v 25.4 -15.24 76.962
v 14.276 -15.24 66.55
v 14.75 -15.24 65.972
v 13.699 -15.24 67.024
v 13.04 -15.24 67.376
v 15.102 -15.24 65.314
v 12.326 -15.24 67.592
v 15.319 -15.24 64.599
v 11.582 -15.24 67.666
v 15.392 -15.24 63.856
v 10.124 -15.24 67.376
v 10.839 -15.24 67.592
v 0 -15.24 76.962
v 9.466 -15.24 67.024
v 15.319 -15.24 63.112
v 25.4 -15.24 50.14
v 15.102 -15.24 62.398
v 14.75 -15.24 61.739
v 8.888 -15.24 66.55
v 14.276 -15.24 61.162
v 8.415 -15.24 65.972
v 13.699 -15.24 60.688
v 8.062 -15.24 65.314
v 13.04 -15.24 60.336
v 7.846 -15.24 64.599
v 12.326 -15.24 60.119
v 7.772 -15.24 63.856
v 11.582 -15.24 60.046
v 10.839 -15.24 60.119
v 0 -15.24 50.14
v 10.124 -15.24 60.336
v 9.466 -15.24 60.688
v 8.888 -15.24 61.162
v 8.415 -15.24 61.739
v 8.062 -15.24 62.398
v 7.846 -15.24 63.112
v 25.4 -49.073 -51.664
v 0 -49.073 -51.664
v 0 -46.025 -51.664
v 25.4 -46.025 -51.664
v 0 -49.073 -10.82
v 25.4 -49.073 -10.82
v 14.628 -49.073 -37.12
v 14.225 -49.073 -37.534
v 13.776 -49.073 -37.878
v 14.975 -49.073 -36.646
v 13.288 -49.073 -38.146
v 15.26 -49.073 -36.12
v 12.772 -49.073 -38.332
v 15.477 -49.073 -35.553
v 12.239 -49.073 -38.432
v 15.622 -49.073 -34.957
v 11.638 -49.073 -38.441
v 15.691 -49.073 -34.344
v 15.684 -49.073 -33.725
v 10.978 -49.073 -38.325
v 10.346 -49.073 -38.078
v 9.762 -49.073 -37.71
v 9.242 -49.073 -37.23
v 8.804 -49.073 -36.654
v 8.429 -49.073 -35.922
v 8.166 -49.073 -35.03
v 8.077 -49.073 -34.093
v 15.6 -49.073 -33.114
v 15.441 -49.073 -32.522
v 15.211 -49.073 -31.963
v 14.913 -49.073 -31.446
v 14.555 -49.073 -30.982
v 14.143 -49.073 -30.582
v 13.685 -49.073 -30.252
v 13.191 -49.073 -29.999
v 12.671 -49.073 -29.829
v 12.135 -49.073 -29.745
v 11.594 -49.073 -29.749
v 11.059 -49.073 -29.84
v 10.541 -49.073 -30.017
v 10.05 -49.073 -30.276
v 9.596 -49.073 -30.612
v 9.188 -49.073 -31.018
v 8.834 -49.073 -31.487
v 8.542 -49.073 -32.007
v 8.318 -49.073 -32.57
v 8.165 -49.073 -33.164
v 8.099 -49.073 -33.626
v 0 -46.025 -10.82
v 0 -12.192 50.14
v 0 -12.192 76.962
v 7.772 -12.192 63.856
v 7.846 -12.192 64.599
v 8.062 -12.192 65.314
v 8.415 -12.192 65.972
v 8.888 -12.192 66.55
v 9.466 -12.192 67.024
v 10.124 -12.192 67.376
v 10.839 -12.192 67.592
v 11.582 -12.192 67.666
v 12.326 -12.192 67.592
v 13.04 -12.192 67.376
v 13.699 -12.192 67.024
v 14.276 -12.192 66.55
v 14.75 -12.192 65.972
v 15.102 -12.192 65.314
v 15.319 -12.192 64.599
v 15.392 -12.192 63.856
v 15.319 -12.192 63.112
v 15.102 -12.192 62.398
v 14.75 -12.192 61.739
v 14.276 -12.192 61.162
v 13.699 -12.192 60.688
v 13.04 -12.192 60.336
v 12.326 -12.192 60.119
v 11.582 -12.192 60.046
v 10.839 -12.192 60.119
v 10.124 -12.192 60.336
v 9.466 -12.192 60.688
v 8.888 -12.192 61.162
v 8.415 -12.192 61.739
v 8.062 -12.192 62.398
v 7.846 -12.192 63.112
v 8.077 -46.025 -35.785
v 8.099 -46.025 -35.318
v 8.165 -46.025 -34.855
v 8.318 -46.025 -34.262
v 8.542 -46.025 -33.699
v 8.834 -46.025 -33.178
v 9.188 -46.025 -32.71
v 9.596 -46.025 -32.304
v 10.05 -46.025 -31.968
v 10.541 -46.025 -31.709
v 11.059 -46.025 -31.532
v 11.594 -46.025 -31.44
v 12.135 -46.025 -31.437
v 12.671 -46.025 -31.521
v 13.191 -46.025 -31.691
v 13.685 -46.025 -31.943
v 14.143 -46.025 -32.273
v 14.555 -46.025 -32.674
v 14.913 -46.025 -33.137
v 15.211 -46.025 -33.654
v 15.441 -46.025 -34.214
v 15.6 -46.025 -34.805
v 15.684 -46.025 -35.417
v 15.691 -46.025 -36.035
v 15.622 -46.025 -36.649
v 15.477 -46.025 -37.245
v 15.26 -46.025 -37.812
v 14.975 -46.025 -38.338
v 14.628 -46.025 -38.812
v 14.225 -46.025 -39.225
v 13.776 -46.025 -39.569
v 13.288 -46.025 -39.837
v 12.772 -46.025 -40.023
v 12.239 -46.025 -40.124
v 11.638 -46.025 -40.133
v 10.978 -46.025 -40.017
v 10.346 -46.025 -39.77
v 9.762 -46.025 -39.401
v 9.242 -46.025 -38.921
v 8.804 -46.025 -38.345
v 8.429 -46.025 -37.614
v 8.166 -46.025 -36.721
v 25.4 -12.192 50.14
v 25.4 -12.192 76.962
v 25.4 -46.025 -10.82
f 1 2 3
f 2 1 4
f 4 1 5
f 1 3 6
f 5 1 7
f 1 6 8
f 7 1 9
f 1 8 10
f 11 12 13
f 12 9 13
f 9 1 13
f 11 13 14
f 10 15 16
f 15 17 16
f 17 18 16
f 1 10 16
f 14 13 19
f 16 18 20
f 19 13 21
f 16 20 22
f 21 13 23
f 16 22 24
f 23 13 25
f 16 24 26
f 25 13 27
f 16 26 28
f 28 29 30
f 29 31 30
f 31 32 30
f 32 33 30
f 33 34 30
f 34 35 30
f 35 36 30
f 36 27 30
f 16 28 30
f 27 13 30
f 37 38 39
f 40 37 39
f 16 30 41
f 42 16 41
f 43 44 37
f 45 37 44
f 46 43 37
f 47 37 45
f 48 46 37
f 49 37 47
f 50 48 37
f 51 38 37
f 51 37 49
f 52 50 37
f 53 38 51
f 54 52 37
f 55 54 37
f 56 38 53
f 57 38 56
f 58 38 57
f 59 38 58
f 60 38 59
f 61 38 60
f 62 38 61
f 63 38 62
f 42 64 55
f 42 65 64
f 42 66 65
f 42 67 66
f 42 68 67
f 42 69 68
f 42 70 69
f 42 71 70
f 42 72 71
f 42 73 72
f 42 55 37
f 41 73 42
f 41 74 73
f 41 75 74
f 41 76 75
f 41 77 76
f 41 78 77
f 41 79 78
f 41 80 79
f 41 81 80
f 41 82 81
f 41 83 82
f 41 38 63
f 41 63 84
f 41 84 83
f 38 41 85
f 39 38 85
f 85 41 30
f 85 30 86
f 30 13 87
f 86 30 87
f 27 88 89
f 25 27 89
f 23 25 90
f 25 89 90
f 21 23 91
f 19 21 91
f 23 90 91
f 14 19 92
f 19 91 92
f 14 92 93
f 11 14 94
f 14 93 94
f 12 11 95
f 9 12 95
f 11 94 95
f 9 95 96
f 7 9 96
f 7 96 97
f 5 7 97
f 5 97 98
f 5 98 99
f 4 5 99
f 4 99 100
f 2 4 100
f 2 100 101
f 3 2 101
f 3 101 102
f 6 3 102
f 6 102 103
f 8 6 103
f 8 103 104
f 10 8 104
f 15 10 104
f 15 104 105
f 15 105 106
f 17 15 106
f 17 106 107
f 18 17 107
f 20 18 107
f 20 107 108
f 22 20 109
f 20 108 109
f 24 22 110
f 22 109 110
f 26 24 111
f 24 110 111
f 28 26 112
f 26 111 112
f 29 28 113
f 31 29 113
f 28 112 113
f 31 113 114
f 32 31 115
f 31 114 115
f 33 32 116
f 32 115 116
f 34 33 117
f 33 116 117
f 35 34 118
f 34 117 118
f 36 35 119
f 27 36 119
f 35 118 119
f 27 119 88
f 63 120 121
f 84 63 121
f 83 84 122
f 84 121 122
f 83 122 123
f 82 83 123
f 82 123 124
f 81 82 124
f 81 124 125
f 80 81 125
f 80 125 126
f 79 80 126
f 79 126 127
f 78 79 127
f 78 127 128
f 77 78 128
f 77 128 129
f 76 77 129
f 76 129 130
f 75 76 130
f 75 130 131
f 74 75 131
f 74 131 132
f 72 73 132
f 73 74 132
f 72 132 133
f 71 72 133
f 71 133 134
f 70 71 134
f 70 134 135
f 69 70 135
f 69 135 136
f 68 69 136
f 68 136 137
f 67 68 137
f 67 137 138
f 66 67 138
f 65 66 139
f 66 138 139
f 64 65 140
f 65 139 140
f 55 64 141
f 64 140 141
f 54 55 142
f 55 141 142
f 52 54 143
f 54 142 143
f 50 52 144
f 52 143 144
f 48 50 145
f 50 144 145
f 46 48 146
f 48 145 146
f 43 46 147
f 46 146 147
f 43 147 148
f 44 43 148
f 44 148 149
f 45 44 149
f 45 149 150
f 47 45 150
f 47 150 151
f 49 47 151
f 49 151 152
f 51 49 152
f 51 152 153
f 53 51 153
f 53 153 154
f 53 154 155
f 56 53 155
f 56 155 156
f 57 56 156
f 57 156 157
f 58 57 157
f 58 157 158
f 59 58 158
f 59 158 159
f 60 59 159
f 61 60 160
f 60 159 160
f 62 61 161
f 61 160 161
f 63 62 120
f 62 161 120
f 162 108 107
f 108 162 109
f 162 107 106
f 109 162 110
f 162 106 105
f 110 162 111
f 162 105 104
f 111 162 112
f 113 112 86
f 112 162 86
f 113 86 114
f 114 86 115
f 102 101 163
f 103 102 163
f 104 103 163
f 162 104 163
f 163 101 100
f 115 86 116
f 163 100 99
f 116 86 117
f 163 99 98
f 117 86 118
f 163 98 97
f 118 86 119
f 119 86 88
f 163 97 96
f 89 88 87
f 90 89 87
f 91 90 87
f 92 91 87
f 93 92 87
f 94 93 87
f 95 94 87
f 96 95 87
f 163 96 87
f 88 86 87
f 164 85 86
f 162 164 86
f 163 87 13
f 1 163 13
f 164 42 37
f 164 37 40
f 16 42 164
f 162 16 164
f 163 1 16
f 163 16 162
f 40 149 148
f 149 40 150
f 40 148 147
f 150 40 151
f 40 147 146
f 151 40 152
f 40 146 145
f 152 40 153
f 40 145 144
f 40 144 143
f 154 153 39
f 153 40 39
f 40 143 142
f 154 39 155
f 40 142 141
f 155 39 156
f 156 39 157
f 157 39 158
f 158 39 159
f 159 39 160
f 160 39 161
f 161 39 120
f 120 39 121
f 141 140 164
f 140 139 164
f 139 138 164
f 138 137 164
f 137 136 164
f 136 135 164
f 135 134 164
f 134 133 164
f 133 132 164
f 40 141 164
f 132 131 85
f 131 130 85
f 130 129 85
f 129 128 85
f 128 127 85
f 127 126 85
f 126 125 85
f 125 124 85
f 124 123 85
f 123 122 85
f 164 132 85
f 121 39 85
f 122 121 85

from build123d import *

# Parameters (mm, degrees)
F0_W     = 3.048003
F0_H     = 40.843204
F1_DEPTH = 25.4
F3_D     = 7.62
F5_D     = 7.62


with BuildPart() as f1:
    # F0 (on Right) → F1 (new body)
    with BuildSketch(Plane.YZ):
        Polygon((-15.24, 50.139602), (-49.072802, -10.8204), (-46.024799, -10.8204), (-12.192001, 50.139596), (-12.192001, 76.962002), (-15.24, 76.962002), align=None)
        with Locations((-47.5488, -31.242002)):
            Rectangle(F0_W, F0_H)
    extrude(amount=F1_DEPTH)

    # F3 (through all)
    with Locations(Plane(origin=(0, -32.925578, 18.273696), x_dir=(1, 0, 0), z_dir=(0, -0.874363, 0.485272))):
        with Locations((11.887199, -53.623594)):
            Hole(F3_D / 2)

    # F5 (through all)
    with Locations(Plane.XZ.offset(15.24)):
        with Locations((11.582401, 63.855603)):
            Hole(F5_D / 2)


solid = f1.part
